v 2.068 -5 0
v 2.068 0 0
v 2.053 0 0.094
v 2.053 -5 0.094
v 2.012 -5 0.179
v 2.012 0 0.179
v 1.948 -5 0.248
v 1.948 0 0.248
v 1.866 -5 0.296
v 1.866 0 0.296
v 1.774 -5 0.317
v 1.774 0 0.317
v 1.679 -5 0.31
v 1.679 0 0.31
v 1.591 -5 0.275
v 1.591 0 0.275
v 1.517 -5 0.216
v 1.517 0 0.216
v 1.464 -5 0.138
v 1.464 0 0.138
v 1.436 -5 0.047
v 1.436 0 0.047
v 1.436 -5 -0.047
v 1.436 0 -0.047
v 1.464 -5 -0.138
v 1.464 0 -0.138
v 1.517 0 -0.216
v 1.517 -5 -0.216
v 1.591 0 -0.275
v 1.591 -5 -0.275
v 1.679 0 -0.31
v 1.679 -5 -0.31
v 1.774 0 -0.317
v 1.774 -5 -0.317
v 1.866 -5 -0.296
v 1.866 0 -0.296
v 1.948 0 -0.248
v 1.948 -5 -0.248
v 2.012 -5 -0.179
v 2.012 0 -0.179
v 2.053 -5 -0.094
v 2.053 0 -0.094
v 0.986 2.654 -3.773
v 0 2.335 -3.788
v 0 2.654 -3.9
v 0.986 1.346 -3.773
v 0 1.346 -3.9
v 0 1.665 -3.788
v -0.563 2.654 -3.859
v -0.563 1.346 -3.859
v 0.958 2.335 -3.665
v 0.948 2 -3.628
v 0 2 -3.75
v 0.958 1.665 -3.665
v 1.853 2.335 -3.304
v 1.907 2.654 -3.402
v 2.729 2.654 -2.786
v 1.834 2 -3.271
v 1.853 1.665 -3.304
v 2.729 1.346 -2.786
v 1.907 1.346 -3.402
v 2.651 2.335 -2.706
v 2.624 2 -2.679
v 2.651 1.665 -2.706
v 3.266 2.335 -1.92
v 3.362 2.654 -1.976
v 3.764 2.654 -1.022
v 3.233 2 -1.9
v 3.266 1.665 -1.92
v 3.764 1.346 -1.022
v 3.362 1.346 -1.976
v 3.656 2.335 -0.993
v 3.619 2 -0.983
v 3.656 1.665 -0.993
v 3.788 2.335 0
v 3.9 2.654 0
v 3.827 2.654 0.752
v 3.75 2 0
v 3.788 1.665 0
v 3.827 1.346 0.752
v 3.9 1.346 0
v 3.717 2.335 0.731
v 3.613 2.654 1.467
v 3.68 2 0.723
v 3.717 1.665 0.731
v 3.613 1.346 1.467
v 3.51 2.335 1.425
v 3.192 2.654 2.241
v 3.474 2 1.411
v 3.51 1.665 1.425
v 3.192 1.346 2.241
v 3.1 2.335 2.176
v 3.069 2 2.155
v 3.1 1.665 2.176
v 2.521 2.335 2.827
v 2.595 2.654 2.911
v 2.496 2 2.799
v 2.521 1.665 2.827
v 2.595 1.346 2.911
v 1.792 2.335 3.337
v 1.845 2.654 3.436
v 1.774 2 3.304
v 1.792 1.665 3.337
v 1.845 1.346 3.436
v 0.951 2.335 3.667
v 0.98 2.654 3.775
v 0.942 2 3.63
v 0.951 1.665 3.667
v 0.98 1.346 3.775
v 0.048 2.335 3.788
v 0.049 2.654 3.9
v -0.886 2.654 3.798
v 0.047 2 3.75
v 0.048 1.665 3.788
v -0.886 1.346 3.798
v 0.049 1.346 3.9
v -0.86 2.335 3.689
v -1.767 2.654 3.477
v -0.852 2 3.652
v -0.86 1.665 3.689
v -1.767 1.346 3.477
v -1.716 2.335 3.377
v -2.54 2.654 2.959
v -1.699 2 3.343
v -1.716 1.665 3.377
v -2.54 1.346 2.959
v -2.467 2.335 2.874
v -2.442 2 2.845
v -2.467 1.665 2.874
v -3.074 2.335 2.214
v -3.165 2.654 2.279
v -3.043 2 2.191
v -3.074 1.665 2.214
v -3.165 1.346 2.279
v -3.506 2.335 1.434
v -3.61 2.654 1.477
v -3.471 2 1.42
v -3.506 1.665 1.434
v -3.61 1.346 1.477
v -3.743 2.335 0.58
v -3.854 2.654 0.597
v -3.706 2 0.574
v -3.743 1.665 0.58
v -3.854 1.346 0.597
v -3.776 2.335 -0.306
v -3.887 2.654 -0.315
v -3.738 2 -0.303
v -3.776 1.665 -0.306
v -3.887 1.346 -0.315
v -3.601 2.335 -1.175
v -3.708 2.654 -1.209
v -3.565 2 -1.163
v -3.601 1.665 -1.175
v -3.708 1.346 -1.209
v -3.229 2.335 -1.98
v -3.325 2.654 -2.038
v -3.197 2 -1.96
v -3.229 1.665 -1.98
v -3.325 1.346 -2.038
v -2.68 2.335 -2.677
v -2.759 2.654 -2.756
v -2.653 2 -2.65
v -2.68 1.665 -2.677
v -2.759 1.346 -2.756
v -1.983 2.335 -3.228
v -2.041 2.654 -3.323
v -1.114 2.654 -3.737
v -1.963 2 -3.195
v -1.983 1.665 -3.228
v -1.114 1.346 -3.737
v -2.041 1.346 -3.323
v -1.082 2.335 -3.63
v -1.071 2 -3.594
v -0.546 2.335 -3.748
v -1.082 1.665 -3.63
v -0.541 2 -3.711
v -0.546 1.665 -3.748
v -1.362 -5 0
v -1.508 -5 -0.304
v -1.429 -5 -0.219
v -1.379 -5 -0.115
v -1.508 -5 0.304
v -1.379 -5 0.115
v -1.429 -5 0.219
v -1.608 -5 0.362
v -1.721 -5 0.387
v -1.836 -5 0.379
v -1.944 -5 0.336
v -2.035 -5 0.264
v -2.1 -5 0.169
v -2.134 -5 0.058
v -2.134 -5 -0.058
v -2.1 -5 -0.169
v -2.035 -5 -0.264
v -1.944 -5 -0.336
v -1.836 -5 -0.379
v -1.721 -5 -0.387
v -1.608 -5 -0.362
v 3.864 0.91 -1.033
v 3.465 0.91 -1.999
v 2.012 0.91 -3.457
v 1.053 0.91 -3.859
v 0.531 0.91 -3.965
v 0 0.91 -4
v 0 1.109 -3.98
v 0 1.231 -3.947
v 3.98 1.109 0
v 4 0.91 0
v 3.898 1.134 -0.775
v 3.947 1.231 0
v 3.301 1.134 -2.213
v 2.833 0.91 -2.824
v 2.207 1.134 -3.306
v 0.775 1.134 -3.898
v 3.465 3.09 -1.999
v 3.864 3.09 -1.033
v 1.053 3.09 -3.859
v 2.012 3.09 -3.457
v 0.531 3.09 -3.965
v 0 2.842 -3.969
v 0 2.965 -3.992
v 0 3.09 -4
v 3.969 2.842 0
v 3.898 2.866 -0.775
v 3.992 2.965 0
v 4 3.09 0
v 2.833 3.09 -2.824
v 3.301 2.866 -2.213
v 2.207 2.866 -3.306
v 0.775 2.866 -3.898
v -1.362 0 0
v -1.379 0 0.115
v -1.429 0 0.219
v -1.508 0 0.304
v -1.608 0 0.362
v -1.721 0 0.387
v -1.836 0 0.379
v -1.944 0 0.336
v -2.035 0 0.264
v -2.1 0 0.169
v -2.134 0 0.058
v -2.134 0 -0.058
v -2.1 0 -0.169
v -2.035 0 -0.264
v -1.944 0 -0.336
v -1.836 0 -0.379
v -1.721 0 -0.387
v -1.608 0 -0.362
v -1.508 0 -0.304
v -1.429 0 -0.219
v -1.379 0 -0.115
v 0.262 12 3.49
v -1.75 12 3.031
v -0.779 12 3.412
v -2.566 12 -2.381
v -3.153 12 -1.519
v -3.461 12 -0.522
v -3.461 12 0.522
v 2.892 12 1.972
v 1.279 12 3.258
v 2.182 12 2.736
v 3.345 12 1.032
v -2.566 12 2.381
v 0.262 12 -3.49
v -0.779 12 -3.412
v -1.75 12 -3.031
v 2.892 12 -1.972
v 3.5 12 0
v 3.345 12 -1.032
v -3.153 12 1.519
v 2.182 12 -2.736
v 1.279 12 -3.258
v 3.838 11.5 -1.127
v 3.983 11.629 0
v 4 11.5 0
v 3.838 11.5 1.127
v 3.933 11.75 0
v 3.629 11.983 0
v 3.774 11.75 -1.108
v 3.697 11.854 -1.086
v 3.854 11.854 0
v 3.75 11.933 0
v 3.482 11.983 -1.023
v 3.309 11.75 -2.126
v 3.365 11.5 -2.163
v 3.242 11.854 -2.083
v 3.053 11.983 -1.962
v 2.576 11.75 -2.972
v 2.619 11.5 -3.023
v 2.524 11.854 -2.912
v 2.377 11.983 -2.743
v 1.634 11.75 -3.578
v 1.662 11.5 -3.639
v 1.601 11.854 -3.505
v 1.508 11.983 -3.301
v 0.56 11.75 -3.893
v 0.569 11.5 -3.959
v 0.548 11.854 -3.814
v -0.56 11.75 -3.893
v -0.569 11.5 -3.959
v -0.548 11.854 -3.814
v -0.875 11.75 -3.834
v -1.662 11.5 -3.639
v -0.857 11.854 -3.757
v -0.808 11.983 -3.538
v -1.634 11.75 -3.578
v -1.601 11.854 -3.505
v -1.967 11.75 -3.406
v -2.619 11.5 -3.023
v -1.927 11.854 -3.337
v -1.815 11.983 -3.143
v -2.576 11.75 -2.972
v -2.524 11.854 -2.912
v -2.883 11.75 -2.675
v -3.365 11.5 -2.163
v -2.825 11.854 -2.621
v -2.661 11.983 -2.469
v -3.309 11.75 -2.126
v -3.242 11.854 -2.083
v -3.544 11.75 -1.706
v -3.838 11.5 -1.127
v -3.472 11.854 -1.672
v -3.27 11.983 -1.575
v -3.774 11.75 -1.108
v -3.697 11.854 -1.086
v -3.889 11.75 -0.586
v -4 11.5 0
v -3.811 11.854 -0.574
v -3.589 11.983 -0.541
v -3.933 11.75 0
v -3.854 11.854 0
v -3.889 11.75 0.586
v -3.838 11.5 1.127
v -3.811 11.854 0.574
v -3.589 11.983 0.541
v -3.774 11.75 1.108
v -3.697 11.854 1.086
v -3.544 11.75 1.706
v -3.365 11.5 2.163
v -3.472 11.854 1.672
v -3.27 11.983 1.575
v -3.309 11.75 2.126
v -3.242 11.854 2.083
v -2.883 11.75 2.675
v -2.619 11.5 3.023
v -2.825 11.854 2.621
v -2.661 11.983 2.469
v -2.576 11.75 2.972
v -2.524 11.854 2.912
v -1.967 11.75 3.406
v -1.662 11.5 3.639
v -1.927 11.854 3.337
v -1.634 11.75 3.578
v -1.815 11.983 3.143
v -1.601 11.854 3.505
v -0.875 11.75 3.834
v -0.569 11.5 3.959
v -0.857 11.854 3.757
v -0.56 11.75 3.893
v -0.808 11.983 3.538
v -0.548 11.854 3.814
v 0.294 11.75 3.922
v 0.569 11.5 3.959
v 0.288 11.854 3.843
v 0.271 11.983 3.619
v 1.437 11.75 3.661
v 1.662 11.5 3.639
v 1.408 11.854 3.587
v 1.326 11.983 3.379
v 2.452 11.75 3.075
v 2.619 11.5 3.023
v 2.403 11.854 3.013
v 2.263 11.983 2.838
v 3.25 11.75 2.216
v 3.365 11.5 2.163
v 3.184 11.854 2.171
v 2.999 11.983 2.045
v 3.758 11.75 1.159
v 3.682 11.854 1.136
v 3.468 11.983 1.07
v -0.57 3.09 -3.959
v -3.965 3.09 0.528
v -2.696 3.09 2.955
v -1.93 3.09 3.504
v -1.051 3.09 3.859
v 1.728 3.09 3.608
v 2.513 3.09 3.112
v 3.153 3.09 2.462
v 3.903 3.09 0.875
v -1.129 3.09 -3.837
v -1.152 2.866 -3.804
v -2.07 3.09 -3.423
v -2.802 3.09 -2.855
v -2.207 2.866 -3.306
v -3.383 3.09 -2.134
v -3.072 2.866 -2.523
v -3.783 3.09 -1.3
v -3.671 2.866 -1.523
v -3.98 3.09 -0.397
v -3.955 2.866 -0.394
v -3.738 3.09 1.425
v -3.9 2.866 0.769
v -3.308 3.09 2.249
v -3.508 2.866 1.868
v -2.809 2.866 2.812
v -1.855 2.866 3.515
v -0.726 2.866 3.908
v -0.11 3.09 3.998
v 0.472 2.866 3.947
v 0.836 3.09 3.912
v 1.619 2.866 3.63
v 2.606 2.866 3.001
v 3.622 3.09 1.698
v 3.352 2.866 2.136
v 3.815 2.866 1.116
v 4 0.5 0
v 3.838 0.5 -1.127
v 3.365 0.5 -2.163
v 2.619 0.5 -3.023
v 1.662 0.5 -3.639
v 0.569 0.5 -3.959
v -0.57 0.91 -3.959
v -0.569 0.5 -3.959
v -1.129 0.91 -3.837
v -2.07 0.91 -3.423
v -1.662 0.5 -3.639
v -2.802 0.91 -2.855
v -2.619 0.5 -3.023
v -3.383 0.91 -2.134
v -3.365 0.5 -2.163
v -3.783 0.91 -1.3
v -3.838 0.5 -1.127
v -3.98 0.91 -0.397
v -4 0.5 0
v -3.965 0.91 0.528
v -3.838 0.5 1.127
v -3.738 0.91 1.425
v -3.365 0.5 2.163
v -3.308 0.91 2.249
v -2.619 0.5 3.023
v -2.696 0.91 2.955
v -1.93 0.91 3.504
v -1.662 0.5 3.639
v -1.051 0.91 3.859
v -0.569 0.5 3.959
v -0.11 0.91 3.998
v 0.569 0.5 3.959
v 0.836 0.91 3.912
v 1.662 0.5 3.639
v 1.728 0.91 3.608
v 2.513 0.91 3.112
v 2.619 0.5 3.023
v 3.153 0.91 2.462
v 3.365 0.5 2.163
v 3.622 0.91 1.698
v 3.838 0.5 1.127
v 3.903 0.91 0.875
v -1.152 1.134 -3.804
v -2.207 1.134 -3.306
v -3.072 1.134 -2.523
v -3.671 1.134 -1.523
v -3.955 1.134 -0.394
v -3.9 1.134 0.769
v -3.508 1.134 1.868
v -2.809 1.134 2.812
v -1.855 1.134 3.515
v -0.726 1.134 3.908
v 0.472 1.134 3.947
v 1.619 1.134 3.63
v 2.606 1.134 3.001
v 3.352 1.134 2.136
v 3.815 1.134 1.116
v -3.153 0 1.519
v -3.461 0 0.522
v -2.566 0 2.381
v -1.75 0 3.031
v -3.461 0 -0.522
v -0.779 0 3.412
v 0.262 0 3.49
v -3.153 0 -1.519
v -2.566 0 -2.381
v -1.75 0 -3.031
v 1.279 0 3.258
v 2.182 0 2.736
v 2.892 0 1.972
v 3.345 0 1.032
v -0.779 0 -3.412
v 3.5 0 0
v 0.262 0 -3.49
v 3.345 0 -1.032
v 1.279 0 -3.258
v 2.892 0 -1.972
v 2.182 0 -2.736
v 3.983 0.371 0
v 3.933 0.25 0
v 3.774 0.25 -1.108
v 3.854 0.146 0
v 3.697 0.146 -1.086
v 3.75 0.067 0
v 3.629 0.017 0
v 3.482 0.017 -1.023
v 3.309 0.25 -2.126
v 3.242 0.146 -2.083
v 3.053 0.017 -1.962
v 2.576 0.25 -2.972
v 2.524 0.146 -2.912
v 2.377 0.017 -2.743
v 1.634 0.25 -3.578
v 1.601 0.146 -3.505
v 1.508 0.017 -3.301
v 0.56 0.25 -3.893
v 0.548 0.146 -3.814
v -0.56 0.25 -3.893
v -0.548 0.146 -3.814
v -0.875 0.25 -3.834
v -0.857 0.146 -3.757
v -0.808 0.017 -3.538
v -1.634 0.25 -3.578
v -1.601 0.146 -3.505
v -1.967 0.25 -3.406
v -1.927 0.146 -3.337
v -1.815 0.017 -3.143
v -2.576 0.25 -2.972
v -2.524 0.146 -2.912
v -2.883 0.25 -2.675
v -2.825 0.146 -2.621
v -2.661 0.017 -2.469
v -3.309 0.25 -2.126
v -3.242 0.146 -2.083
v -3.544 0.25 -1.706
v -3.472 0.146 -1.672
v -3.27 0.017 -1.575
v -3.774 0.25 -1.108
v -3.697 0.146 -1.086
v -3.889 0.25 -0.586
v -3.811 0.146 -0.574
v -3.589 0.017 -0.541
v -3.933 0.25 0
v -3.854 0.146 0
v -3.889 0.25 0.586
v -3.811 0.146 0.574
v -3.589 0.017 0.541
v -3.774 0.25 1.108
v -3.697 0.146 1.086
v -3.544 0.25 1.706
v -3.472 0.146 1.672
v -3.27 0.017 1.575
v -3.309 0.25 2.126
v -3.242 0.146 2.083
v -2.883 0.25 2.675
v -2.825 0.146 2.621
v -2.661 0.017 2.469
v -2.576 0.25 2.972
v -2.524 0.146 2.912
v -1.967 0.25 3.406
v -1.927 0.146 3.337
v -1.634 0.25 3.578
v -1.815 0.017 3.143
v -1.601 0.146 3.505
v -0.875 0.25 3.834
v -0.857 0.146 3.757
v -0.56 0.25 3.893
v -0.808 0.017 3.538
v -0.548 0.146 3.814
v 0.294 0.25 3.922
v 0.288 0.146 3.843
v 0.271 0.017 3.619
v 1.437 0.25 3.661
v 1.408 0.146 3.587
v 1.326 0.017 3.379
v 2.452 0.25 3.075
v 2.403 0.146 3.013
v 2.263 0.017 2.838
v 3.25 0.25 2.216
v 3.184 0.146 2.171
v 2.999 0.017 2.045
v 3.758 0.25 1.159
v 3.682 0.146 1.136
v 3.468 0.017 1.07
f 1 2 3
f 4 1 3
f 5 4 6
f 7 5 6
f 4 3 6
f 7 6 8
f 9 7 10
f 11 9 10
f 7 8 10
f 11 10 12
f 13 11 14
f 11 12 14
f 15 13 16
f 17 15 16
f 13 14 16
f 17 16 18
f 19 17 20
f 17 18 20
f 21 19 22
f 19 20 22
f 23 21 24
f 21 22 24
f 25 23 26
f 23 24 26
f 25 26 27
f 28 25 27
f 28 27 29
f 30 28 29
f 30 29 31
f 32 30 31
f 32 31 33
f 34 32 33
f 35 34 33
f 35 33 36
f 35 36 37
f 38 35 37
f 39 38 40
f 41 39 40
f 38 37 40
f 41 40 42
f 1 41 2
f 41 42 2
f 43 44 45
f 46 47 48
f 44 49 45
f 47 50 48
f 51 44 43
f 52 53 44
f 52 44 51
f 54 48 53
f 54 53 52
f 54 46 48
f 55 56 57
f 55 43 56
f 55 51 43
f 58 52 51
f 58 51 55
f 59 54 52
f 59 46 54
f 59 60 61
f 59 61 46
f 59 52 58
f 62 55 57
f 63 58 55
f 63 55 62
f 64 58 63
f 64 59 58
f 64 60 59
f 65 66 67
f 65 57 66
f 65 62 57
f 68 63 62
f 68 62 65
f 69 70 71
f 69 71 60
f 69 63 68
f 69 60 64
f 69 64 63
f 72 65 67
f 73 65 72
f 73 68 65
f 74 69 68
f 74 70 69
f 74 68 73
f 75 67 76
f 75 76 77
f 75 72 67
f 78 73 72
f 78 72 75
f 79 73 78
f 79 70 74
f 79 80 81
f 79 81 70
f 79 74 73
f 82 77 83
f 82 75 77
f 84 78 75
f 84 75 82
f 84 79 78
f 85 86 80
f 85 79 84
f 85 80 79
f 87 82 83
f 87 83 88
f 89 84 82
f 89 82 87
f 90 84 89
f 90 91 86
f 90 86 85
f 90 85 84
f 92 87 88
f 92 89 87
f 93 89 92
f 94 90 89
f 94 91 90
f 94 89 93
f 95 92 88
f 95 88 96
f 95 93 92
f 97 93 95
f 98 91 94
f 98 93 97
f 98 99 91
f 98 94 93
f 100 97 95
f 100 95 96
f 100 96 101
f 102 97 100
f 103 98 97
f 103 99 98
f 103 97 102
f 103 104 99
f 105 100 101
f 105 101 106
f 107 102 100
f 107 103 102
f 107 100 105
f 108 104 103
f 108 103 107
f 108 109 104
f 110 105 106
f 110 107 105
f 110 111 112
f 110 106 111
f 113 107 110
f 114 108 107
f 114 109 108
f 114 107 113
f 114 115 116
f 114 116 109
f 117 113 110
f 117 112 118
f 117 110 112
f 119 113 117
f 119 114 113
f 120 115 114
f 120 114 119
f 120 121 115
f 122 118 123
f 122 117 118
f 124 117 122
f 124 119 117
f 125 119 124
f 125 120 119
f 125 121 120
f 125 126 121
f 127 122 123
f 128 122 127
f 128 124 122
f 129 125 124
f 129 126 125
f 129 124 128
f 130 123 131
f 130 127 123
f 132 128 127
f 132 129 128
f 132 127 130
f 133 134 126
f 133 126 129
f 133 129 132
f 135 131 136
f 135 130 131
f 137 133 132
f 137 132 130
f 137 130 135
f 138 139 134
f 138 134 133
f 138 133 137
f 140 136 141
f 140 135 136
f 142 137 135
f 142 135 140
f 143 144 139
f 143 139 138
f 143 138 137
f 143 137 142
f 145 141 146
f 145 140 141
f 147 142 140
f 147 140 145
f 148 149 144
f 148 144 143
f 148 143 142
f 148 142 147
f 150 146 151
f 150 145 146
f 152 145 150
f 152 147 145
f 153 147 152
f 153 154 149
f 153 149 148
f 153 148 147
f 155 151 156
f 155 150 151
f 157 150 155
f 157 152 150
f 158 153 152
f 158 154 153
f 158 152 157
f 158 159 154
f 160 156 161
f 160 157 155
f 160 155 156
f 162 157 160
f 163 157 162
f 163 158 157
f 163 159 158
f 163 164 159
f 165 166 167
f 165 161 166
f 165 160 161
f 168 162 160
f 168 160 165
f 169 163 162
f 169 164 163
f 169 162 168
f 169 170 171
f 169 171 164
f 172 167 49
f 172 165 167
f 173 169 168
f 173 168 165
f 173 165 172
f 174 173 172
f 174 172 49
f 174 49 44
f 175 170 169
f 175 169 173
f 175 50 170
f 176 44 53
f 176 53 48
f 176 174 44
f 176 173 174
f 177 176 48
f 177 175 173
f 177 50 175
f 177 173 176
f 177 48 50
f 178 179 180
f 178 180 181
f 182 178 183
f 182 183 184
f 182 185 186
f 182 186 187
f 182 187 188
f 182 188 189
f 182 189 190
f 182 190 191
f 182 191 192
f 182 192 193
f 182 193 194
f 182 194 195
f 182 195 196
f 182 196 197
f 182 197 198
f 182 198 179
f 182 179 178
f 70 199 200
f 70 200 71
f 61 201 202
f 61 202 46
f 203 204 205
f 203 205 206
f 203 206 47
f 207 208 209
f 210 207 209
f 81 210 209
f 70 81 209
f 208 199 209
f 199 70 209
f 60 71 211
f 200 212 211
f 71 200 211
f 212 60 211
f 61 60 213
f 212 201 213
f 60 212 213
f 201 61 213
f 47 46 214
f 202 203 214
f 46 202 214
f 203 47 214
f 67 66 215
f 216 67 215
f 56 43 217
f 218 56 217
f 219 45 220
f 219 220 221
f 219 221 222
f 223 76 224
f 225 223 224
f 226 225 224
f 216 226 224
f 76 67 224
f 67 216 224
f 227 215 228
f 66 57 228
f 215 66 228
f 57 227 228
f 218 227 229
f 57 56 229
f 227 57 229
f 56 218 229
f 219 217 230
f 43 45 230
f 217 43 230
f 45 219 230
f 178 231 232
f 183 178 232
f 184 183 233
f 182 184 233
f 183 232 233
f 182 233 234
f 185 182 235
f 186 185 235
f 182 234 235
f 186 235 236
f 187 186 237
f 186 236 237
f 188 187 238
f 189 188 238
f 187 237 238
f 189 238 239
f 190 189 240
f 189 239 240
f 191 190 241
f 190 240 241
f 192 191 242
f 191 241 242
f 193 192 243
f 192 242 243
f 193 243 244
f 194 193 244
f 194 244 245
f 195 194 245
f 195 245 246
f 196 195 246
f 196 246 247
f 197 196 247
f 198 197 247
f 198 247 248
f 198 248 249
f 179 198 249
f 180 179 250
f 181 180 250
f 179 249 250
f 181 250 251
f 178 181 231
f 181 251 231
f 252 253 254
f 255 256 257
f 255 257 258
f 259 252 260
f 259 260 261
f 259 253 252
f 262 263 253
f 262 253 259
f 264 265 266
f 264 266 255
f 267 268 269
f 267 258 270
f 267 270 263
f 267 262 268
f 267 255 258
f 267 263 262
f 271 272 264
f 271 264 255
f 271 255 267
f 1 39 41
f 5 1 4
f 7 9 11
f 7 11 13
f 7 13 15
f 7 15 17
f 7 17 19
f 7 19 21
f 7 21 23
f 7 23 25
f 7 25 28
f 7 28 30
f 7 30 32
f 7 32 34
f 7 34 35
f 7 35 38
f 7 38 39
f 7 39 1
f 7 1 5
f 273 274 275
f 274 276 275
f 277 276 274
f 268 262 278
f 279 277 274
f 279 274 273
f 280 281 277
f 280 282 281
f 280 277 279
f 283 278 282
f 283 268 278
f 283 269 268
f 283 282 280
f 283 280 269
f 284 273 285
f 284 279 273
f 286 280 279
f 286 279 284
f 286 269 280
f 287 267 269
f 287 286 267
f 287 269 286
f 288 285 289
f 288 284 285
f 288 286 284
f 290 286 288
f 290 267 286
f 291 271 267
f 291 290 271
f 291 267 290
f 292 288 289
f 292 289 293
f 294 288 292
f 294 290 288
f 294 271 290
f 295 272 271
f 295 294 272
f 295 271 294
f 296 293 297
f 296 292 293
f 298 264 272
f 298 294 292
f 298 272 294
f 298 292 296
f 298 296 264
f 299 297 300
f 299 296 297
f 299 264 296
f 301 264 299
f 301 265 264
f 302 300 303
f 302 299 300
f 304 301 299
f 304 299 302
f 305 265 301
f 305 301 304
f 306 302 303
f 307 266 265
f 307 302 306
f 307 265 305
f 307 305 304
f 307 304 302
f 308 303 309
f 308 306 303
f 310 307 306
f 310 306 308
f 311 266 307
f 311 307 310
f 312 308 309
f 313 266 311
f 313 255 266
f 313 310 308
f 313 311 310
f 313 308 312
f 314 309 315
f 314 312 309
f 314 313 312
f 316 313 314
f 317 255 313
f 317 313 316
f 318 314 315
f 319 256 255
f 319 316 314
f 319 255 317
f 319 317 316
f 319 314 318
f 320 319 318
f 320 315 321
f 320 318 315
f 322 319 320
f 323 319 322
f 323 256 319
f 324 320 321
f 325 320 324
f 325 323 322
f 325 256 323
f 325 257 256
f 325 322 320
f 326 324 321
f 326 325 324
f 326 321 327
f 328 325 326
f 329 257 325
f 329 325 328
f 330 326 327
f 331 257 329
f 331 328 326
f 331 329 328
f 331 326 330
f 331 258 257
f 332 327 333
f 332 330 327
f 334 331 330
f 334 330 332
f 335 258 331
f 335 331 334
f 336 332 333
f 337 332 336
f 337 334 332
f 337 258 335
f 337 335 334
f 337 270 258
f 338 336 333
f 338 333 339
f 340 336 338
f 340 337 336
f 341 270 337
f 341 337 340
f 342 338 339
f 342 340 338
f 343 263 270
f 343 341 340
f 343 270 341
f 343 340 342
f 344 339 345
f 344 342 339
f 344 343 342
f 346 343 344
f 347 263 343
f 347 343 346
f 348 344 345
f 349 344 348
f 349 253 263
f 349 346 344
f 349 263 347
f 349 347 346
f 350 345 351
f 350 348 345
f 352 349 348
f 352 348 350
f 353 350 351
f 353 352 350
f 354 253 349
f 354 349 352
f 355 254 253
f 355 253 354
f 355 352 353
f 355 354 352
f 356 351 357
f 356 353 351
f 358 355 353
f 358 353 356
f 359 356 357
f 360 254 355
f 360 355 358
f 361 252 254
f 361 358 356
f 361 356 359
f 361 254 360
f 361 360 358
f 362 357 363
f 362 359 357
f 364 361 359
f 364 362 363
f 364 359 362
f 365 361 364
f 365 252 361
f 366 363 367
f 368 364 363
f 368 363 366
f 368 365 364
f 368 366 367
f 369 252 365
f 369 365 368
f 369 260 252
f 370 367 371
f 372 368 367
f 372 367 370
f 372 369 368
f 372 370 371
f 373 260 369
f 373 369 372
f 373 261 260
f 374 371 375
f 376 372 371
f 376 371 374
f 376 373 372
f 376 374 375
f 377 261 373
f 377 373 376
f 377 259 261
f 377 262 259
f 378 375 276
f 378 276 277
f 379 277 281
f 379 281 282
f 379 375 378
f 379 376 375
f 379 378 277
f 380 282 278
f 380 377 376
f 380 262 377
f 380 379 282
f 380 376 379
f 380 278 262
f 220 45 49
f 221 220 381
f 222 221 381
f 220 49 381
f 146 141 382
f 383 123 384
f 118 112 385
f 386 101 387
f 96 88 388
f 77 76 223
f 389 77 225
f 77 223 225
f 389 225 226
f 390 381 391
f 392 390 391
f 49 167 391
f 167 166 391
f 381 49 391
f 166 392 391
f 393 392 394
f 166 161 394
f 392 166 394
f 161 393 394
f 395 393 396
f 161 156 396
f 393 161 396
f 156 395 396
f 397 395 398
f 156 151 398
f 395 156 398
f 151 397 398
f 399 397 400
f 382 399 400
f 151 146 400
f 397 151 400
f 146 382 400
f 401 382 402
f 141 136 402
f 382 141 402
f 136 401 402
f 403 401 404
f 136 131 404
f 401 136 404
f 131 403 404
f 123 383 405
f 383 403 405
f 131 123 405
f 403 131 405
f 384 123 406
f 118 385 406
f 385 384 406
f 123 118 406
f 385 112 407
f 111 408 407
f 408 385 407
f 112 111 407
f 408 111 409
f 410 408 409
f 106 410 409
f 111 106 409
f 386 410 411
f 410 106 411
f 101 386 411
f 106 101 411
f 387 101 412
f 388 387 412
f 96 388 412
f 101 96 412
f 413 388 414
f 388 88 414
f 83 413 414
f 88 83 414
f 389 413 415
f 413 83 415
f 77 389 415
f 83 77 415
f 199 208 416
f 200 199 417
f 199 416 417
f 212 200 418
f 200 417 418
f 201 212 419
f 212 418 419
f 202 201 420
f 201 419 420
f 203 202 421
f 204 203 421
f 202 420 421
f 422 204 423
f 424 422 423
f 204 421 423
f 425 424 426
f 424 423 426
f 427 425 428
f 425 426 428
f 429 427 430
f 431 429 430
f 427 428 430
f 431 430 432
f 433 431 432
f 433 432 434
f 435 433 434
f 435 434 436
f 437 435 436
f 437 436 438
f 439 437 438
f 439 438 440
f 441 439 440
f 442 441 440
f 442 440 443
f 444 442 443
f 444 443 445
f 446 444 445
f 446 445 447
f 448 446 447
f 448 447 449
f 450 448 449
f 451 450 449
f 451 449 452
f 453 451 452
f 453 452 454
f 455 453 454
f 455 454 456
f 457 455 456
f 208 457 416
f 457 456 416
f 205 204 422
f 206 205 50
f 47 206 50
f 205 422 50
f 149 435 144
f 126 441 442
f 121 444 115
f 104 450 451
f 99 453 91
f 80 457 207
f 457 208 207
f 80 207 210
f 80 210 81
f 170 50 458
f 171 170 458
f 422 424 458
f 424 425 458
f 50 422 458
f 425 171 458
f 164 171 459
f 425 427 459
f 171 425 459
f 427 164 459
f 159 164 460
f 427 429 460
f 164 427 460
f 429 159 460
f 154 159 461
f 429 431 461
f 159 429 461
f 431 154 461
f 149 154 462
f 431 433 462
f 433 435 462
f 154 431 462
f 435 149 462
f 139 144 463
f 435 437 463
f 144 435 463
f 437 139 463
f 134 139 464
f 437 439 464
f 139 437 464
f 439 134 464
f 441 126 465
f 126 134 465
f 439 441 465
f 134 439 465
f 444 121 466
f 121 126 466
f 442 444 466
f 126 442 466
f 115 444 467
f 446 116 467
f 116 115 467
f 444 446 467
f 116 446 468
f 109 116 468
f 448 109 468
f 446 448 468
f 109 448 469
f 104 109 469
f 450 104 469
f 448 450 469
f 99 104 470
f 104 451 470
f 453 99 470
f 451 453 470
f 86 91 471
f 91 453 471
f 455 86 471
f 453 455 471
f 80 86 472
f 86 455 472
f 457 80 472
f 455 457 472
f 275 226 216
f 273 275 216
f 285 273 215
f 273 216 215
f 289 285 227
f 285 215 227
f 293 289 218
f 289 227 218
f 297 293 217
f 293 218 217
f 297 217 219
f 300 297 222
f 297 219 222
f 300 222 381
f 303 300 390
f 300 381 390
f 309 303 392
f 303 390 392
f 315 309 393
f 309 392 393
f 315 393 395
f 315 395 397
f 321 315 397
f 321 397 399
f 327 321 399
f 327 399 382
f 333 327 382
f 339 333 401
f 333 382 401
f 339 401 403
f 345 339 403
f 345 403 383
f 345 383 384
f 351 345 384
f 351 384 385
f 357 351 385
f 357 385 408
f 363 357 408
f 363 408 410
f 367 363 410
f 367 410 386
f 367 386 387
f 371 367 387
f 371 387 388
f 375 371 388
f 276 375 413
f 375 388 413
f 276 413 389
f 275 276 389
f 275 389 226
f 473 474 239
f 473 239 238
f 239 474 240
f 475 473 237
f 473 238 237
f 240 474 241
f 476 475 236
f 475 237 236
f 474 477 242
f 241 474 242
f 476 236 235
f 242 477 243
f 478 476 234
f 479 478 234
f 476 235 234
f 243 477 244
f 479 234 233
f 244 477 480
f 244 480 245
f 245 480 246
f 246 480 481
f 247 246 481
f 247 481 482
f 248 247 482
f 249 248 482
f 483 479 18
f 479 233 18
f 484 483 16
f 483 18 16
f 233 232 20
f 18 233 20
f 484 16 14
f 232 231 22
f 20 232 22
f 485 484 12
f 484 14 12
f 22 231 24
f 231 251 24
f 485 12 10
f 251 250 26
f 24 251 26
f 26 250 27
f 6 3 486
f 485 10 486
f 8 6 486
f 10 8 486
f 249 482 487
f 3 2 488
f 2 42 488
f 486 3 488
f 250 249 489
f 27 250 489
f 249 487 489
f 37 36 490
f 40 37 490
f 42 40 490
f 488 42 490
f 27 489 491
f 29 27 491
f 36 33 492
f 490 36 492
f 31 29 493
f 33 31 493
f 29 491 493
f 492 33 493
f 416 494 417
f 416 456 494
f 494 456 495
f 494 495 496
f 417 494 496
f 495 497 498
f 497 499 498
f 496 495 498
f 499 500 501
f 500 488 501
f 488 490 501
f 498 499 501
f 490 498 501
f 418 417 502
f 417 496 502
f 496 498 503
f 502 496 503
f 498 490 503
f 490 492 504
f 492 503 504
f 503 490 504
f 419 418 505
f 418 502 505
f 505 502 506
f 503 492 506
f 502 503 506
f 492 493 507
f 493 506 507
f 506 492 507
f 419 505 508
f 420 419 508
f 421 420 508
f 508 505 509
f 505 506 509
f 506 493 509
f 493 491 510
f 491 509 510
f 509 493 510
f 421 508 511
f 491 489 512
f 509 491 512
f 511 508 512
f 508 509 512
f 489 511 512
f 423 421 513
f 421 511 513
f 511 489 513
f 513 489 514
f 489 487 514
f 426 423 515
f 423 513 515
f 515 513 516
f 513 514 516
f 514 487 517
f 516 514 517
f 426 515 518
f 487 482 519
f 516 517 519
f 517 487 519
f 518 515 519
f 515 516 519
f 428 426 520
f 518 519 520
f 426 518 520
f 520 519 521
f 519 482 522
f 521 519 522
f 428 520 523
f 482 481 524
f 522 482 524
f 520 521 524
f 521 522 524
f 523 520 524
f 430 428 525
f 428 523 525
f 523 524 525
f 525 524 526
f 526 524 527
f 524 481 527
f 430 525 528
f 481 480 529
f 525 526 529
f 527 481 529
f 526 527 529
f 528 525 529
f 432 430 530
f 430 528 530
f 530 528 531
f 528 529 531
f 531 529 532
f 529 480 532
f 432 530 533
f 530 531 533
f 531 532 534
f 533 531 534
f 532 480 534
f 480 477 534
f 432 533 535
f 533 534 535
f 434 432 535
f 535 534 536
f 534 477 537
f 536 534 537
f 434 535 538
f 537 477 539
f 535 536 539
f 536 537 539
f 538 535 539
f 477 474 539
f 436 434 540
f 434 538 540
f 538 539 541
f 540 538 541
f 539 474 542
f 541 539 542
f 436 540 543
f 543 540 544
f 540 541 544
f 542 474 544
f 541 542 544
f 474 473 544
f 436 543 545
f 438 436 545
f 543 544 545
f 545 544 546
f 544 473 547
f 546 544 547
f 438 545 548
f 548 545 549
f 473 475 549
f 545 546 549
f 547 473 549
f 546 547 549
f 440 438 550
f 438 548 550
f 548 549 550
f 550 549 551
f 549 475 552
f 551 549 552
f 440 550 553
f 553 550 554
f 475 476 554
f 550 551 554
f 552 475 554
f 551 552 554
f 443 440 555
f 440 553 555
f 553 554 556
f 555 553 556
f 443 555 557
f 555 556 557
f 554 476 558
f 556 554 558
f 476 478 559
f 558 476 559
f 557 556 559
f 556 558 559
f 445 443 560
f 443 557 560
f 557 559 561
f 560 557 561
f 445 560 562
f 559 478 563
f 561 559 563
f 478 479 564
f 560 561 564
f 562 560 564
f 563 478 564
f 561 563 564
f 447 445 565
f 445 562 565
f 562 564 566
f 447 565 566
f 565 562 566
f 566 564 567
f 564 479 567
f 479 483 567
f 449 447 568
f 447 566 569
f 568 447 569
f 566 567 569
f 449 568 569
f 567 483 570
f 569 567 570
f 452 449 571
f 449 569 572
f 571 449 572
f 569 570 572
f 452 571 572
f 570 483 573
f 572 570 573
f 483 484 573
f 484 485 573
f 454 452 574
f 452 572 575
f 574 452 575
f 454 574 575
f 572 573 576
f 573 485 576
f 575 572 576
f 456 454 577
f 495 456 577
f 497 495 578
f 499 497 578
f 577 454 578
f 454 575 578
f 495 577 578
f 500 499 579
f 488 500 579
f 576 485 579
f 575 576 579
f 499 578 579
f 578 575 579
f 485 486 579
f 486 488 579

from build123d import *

# Parameters (mm, degrees)
SKETCH1_R           = 4
BOSS_EXTRUDE1_DEPTH = 12
SKETCH2_R           = 0.317566637
SKETCH2_R_2         = 0.388464661
BOSS_EXTRUDE2_DEPTH = 5
SKETCH3_R           = 1.5
FILLET1_R           = 1
FILLET2_R           = 0.5
FILLET3_R           = 0.5


with BuildPart() as part:
    # Sketch1 → Boss-Extrude1 (new body)
    with BuildSketch(Plane(origin=(0, 0, 0), x_dir=(1, 0, 0), z_dir=(0, 1, 0))):
        Circle(SKETCH1_R)
    extrude(amount=BOSS_EXTRUDE1_DEPTH)

    # Sketch2 → Boss-Extrude2 (add)
    with BuildSketch(Plane.XZ):
        with Locations((1.75, 0)):
            Circle(SKETCH2_R)
        with Locations((-1.75, 0)):
            Circle(SKETCH2_R_2)
    extrude(amount=BOSS_EXTRUDE2_DEPTH)

    # Sketch3 → Cut-Revolve1 (revolve, cut)
    with BuildSketch(Plane(origin=(0, 0, 0), x_dir=(0, 0, -1), z_dir=(1, 0, 0))):
        with Locations((5.25, 2)):
            Circle(SKETCH3_R)
    revolve(axis=Axis((0, 22.78154861, 0), (0, -1, 0)), mode=Mode.SUBTRACT)

    # Fillet1
    fillet1_edges = [part.edges().sort_by_distance(p)[0] for p in [
        (-2.828427125, 2.829156198, 2.828427125),
        (-2.828427125, 1.170843802, 2.828427125),
    ]]
    fillet(fillet1_edges, radius=FILLET1_R)

    # Fillet2
    fillet2_edges = [part.edges().sort_by_distance(p)[0] for p in [
        (-4, 12, 0),
    ]]
    fillet(fillet2_edges, radius=FILLET2_R)

    # Fillet3
    fillet3_edges = [part.edges().sort_by_distance(p)[0] for p in [
        (-4, 0, 0),
    ]]
    fillet(fillet3_edges, radius=FILLET3_R)


solid = part.part
